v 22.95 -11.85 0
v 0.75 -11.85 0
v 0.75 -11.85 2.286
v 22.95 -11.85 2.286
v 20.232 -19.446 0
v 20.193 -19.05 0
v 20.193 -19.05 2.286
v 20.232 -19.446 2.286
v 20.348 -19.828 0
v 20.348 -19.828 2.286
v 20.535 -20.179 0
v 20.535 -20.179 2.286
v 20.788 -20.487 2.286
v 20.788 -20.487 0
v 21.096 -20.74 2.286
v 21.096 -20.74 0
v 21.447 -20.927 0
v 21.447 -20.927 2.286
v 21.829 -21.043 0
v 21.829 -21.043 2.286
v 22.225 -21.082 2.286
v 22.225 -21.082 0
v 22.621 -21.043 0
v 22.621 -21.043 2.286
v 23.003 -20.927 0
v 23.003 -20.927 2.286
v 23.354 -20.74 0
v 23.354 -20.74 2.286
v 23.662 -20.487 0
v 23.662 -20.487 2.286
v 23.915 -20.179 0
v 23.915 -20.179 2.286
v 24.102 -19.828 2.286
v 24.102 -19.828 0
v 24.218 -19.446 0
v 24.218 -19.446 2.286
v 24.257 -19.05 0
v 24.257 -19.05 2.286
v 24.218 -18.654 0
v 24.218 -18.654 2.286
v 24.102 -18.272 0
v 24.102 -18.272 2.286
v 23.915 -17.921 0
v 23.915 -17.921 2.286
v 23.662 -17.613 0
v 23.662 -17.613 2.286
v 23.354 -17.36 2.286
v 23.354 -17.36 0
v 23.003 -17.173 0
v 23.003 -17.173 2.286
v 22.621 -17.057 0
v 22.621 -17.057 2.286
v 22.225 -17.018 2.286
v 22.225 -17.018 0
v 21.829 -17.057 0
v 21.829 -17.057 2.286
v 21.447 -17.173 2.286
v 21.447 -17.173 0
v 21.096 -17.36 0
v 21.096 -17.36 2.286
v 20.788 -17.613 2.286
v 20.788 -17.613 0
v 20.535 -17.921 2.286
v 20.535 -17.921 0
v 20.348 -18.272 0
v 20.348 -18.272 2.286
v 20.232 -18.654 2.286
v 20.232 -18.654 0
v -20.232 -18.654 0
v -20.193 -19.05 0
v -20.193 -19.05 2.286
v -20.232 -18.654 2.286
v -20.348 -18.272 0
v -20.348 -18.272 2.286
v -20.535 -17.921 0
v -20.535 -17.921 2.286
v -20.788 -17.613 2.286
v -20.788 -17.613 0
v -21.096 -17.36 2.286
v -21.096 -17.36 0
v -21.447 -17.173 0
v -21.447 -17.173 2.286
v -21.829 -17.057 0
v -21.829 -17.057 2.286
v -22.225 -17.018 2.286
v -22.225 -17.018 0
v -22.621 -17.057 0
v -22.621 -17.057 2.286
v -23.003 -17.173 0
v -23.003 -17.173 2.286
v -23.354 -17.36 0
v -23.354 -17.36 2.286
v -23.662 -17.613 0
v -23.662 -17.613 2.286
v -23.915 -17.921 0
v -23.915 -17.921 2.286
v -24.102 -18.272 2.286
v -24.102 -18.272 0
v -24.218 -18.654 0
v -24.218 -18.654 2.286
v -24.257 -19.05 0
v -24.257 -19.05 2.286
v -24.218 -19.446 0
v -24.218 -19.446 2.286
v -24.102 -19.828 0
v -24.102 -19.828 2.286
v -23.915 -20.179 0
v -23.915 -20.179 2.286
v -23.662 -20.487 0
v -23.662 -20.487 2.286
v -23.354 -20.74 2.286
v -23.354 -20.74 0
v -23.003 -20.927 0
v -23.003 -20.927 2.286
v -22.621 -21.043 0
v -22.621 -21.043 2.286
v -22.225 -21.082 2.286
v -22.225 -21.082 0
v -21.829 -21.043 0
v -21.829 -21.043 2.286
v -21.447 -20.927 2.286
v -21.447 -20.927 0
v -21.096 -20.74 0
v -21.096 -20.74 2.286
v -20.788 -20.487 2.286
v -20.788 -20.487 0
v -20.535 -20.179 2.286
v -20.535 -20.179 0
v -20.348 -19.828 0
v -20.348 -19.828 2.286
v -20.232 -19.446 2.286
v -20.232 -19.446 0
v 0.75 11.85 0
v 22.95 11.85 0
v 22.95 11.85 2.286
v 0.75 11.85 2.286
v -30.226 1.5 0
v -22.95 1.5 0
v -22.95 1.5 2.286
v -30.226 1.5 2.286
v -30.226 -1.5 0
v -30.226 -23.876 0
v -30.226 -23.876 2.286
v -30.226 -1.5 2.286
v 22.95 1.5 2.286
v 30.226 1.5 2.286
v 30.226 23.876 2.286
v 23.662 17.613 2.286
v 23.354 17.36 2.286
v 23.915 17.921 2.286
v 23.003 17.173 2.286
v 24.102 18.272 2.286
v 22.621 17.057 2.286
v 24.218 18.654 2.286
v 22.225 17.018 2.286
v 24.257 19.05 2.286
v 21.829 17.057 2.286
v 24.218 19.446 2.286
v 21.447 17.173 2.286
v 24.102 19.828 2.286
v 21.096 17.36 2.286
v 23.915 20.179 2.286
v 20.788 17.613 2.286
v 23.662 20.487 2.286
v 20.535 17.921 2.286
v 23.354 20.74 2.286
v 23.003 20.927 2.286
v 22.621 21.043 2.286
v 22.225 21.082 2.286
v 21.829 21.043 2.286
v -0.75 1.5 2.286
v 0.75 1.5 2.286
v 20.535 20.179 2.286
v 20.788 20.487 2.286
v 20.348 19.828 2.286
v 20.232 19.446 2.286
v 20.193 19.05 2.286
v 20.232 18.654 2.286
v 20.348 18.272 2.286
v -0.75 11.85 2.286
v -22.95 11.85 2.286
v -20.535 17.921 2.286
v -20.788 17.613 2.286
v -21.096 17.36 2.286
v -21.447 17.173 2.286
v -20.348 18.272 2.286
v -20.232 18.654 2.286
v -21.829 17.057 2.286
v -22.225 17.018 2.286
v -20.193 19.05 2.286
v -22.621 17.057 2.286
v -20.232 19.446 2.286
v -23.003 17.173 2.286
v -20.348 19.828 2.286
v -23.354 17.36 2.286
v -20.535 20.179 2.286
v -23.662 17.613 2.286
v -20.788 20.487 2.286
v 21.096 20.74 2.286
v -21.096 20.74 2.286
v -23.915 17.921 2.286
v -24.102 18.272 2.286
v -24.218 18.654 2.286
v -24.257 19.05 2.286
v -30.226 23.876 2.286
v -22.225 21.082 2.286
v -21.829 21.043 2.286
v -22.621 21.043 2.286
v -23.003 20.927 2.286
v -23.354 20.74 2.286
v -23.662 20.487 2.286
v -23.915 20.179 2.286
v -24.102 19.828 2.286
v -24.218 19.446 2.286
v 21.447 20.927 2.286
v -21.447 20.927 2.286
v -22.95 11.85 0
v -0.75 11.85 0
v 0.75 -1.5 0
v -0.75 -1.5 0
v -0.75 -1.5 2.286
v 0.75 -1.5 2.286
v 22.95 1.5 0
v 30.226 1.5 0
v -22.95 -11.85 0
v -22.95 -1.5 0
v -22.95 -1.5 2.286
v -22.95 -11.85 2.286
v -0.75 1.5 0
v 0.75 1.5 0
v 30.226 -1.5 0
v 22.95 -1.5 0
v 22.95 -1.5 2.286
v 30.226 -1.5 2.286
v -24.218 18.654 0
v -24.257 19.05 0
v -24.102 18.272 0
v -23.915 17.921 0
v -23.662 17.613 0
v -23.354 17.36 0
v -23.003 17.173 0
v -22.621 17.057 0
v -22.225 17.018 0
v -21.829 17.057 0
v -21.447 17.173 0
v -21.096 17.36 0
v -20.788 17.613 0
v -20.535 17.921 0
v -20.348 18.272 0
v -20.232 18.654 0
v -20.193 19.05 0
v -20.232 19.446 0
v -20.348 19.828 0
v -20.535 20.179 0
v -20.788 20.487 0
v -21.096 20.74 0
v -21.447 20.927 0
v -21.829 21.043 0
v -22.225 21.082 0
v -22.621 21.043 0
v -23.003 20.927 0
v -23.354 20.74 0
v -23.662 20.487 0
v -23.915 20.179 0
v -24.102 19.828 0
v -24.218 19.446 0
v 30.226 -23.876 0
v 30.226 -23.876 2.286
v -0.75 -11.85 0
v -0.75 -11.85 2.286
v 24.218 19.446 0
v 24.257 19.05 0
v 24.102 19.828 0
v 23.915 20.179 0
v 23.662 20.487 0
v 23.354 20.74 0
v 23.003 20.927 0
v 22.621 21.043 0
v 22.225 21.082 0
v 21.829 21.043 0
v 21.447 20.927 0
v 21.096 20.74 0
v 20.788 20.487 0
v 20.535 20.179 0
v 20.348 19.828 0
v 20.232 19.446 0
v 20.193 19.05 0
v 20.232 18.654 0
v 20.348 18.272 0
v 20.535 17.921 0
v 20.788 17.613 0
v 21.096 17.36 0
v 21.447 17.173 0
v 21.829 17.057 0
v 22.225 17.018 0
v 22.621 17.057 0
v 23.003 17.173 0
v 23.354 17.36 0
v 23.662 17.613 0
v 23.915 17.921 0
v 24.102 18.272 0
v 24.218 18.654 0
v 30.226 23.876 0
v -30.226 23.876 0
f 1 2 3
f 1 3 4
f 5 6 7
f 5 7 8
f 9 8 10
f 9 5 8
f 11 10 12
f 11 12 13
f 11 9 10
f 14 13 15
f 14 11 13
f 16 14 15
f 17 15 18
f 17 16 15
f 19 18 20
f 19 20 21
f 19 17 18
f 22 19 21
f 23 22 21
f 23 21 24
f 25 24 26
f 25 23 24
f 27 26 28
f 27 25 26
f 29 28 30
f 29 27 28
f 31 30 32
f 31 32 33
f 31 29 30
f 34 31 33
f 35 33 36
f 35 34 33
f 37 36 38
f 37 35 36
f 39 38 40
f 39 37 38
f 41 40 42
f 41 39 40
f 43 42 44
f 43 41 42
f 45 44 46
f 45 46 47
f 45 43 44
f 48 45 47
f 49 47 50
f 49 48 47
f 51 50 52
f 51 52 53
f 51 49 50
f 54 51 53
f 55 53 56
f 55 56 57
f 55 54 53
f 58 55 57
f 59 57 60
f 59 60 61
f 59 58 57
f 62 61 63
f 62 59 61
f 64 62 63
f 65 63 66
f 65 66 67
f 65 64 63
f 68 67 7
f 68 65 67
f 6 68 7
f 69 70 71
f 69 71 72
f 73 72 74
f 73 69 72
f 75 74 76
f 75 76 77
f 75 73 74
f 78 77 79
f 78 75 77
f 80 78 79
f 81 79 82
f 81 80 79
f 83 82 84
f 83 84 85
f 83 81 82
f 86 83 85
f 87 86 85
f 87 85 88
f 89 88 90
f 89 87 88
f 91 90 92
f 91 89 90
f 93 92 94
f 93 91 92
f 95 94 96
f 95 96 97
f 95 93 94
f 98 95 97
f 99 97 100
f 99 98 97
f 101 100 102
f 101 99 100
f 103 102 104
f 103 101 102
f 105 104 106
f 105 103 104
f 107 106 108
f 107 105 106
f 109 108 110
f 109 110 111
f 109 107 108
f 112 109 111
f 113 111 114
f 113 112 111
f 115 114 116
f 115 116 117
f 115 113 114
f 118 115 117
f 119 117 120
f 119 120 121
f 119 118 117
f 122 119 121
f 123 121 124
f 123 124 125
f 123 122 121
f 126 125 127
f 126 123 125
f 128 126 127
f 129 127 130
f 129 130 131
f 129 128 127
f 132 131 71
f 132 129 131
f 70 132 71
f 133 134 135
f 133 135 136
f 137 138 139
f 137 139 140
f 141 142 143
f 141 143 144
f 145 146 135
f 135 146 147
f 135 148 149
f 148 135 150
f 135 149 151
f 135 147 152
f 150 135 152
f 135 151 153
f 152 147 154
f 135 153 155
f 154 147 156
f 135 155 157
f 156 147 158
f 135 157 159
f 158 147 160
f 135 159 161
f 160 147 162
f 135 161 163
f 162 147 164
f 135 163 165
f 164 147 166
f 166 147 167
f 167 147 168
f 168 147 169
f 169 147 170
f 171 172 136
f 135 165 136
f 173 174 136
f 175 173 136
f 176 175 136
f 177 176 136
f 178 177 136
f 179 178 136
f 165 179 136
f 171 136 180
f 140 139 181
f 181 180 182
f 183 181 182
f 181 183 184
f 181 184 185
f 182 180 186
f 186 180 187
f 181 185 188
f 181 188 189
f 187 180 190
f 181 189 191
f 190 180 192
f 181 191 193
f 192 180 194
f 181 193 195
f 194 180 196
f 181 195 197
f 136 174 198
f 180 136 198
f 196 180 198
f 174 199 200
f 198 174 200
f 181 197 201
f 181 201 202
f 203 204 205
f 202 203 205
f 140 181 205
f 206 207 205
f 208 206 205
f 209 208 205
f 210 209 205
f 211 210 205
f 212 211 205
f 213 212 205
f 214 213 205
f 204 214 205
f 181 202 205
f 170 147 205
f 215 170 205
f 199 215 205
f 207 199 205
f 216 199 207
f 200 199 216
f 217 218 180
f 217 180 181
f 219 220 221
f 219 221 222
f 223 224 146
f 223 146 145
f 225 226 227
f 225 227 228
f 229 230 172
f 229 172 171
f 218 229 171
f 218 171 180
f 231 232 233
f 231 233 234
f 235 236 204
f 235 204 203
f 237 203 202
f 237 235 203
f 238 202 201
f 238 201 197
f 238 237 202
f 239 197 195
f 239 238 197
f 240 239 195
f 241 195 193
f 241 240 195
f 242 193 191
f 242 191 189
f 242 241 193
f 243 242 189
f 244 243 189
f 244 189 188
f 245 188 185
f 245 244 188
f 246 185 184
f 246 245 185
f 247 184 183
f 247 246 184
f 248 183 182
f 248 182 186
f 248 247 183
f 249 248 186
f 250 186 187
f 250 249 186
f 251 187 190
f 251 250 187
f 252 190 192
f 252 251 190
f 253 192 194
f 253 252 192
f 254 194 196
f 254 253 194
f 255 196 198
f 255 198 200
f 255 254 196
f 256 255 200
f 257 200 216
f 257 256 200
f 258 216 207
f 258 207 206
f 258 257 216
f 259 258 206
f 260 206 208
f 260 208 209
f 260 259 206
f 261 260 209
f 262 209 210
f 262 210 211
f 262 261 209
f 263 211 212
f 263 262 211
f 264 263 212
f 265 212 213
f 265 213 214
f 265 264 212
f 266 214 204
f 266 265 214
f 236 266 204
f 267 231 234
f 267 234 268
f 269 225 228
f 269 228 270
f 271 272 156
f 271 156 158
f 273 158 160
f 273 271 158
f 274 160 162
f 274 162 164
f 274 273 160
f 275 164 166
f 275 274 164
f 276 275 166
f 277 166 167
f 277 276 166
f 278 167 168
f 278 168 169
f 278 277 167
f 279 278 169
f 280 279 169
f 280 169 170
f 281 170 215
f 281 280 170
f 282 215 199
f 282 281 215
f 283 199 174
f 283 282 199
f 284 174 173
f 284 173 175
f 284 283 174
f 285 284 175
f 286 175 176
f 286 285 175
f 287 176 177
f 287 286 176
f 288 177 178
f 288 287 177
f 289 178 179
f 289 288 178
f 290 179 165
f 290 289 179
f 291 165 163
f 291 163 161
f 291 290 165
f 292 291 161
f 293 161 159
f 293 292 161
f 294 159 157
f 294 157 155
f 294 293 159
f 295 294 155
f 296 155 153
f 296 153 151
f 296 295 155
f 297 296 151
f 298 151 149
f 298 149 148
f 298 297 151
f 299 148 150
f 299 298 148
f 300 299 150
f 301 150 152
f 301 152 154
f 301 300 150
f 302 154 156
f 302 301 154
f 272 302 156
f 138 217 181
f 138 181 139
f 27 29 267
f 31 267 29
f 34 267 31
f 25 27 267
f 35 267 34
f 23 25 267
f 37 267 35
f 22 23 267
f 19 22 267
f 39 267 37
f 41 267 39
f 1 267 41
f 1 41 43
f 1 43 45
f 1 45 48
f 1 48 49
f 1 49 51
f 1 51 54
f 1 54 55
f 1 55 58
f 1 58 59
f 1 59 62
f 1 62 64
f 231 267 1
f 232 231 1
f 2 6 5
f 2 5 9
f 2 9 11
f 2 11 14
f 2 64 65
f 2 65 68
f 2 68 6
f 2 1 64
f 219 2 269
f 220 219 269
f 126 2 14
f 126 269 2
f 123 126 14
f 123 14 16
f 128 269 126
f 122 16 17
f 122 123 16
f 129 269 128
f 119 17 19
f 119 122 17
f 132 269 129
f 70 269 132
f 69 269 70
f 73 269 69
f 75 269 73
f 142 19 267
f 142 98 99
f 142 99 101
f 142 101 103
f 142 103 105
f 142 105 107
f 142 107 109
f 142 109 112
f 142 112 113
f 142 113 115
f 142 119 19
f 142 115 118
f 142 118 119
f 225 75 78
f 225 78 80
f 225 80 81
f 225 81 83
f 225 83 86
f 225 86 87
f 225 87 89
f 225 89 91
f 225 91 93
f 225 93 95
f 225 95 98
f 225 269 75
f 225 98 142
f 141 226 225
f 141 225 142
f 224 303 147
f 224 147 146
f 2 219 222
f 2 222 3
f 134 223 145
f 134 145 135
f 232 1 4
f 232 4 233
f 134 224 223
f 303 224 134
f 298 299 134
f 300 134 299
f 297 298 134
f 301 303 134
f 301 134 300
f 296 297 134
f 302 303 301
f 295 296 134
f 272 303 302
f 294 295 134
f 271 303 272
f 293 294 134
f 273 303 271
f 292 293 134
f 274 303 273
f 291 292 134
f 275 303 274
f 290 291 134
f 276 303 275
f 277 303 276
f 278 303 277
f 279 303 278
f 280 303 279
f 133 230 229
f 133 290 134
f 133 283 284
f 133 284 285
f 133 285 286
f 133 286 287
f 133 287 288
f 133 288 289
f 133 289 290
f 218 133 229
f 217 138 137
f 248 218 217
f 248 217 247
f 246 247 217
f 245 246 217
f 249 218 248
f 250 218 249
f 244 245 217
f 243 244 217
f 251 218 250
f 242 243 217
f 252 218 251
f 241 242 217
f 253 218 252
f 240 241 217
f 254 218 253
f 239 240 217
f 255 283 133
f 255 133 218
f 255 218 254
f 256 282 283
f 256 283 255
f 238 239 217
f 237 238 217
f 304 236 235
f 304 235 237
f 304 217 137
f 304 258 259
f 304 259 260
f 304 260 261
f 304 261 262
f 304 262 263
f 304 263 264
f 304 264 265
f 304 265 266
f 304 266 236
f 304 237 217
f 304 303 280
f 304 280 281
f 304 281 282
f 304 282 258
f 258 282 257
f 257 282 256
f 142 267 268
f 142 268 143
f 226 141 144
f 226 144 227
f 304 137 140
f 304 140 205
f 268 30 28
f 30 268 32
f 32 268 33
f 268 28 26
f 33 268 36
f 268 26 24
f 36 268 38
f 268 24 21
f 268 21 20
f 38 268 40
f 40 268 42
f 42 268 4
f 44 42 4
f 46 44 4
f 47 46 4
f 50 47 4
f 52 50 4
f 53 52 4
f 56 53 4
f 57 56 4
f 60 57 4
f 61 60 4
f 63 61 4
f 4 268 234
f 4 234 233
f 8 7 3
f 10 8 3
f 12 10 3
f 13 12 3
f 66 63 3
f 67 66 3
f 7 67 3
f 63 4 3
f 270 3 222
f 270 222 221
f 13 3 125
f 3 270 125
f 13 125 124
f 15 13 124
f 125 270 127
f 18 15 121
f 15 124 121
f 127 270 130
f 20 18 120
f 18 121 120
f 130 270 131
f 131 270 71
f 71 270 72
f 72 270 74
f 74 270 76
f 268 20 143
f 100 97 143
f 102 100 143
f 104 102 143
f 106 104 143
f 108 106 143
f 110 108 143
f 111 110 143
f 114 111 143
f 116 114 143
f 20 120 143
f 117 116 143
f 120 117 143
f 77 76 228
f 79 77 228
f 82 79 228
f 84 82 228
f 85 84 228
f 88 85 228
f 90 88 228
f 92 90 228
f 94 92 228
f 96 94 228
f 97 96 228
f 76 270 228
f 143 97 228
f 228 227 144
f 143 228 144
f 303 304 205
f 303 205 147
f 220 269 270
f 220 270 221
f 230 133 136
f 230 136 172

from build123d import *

# Parameters (mm, degrees)
SKETCH1_R             = 2.032
BOSS_EXTRUDE1_DEPTH   = 2.286
BOSS_EXTRUDE1_2_DEPTH = 2.286


with BuildPart() as part:
    # Sketch1 → Boss-Extrude1 (new body)
    with BuildSketch(Plane.XY):
        Polygon((-30.226, 23.876), (30.226, 23.876), (30.226, 1.5), (22.95, 1.5), (22.95, 11.85), (0.75, 11.85), (0.75, 1.5), (-0.75, 1.5), (-0.75, 11.85), (-22.95, 11.85), (-22.95, 1.5), (-30.226, 1.5), align=None)
        with Locations((22.225, 19.05)):
            Circle(SKETCH1_R, mode=Mode.SUBTRACT)
        with Locations(Location((-22.225, 19.05, 0), (0, 0, 180))):
            Circle(SKETCH1_R, mode=Mode.SUBTRACT)
    extrude(amount=BOSS_EXTRUDE1_DEPTH)


with BuildPart() as body_2:
    # Sketch1 → Boss-Extrude1 2 (new body)
    with BuildSketch(Plane.XY):
        Polygon((22.95, -1.5), (30.226, -1.5), (30.226, -23.876), (-30.226, -23.876), (-30.226, -1.5), (-22.95, -1.5), (-22.95, -11.85), (-0.75, -11.85), (-0.75, -1.5), (0.75, -1.5), (0.75, -11.85), (22.95, -11.85), align=None)
        with Locations(Location((22.225, -19.05, 0), (0, 0, 180))):
            Circle(SKETCH1_R, mode=Mode.SUBTRACT)
        with Locations((-22.225, -19.05)):
            Circle(SKETCH1_R, mode=Mode.SUBTRACT)
    extrude(amount=BOSS_EXTRUDE1_2_DEPTH)


solid = Compound([part.part, body_2.part])
